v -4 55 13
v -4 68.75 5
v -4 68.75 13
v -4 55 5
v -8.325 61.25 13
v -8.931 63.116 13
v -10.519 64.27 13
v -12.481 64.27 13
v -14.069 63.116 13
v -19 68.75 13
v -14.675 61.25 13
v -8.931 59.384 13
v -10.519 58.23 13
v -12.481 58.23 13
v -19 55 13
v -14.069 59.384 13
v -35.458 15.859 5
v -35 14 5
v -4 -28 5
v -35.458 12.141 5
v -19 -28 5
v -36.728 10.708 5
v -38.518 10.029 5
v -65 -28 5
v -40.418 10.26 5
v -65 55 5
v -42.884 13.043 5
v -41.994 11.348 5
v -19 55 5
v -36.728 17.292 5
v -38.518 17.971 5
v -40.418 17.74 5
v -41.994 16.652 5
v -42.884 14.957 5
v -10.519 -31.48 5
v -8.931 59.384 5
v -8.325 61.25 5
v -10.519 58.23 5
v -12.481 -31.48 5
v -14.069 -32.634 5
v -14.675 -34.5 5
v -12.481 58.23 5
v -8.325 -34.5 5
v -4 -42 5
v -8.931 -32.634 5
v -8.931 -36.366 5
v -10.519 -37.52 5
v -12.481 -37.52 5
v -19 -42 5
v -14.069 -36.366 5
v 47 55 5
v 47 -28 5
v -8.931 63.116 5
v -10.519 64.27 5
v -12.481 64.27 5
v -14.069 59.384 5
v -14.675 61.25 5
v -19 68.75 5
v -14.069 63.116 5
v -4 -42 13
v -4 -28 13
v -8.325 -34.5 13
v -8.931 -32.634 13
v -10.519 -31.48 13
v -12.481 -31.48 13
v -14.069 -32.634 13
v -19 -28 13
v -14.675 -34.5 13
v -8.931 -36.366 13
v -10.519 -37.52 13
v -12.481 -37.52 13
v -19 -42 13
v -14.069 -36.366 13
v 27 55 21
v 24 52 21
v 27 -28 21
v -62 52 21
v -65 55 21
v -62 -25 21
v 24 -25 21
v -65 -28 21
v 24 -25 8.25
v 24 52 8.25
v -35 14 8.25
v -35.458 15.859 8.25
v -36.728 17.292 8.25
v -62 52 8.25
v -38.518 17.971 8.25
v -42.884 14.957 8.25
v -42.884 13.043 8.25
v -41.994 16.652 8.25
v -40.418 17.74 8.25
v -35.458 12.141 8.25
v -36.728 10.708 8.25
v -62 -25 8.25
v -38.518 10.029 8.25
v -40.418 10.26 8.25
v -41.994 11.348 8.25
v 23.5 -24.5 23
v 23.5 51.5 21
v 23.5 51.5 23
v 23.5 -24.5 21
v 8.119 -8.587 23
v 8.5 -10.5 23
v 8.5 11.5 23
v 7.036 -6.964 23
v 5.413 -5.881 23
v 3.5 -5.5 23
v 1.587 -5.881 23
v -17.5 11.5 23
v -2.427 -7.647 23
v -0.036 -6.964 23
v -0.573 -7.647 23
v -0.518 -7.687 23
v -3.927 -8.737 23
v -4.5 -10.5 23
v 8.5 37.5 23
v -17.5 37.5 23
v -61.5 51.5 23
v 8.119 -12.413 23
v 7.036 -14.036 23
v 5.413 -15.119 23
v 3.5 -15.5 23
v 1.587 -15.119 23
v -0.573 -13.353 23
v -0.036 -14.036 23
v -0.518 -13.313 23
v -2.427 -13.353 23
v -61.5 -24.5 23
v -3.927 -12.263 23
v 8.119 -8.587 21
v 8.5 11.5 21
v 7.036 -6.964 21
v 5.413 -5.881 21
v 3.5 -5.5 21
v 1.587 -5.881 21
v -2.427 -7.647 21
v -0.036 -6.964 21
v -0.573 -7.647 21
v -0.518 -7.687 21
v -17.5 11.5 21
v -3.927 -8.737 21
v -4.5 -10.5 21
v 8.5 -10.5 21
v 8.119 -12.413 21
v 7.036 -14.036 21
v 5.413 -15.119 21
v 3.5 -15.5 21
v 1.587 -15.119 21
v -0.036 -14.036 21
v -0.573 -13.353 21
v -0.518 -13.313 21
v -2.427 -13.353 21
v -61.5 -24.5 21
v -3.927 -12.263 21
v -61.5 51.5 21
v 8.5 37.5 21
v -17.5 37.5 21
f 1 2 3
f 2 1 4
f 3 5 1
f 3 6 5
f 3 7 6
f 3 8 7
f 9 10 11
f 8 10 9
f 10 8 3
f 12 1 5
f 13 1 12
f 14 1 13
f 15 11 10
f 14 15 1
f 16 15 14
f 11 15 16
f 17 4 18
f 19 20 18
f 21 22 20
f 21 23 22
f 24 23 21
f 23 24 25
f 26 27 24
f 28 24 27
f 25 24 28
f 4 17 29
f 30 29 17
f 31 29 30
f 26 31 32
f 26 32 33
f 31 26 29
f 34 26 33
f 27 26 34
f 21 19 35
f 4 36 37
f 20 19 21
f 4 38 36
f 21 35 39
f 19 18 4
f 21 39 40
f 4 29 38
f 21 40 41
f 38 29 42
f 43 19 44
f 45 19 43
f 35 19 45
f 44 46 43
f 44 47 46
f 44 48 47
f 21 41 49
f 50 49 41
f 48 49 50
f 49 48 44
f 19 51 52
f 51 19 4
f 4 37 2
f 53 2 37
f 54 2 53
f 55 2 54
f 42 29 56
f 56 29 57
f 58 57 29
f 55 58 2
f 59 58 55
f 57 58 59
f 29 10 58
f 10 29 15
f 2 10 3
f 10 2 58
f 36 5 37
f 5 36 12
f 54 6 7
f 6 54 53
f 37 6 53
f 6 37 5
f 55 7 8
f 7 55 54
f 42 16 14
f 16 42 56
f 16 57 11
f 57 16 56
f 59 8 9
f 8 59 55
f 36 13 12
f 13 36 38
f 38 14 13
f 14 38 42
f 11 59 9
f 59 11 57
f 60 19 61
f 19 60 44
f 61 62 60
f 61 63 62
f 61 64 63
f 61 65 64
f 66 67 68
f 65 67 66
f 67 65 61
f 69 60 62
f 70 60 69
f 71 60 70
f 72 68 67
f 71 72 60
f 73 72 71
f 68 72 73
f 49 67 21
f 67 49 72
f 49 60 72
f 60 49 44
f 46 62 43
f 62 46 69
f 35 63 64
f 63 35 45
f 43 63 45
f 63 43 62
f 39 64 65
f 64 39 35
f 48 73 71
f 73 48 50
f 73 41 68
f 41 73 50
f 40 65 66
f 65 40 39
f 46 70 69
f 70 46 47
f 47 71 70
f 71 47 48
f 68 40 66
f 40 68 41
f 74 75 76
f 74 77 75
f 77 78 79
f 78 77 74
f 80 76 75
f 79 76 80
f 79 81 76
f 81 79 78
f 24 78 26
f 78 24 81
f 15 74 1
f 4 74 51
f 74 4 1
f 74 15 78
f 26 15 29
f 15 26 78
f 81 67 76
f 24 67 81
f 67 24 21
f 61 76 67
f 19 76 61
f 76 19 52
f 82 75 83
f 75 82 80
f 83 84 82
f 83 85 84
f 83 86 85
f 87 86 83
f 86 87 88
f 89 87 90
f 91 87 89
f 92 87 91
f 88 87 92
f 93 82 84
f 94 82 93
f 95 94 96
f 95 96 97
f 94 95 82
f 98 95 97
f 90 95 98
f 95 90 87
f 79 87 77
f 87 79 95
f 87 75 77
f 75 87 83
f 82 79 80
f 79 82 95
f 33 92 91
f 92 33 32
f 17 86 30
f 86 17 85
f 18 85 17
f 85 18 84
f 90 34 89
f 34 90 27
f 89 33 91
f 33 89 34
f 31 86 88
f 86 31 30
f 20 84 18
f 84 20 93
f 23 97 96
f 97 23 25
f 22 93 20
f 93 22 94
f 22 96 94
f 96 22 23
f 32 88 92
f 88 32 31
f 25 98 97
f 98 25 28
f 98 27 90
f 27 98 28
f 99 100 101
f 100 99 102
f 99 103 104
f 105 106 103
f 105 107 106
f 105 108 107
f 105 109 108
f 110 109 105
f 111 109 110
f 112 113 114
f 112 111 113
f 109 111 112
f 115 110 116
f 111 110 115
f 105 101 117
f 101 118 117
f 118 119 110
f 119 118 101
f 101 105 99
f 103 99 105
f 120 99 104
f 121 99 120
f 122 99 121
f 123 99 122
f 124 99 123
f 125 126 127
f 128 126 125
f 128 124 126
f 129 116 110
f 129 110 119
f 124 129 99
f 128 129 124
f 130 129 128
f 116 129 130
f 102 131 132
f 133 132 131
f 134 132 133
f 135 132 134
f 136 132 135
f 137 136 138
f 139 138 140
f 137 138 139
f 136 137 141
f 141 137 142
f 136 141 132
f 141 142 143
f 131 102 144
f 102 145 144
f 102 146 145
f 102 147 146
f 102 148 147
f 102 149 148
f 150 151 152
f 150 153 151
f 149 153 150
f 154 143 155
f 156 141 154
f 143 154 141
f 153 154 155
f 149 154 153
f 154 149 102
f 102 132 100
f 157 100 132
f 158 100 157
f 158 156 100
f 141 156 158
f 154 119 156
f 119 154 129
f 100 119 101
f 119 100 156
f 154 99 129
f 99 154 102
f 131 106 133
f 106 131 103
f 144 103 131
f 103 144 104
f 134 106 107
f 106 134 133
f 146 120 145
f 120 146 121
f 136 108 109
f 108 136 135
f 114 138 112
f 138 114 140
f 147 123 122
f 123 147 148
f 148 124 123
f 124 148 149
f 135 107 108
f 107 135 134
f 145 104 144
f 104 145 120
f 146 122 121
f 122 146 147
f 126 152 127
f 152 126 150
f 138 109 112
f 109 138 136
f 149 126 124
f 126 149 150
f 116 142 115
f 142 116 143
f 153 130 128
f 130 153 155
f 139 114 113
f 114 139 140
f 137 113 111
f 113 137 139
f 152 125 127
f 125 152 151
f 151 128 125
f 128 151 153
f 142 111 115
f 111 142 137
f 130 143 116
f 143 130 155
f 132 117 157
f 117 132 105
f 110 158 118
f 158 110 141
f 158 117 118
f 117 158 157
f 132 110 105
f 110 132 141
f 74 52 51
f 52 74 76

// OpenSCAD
module mount (){
	difference(){
		import("gnss_mount.stl", convexity=6);
		translate([-30,-30,0])cube([60,64,20]);
	}
}

module cover (){
	import("gnss_cover.stl", convexity=6);
}

module meatball (){
	import("meatball.stl", convexity=9);
}

module spacer (){
	import("gnss_spacer.stl", convexity=6);
}

module Pitot_bottom (){
	import("Pitot_bottom.stl", convexity=9);
}

module Pitot_cutout (){
	import("Pitot_cutout.stl", convexity=6);
}

module Pitot_top (){
	import("Pitot_top.stl", convexity=6);
}

module plate(){ //top plate
	
	difference(){ //holes into cover
		cube([85,76,2]);
		translate([65,14,-0.5])cylinder(h=3,r=5);
		translate([65-5,14,-0.5])cylinder(h=3,r=3);
		translate([44,36,-0.5])cube([26,26,3]);
		//translate([50,32,-0.5])cube([17,17,1]);
	}

}

module foot(){
	
	difference(){
		cube([15,15,8]);
		translate([7.5,7.5,-0.5])cylinder(d=6.35,9.5);
	}
}

h = 92;
w = 83;

module mount2(){
		
		depth = 16;
		difference(){
			cube([h,w,depth]);
			translate([3,3,3.25])cube([h-6,w-6,depth+5]);
			translate([26,42,-1])cylinder(h=9,r=4);
		}
}

translate([27,13.5,15])polyhedron(
  points=[ [0,w/2,6], //0
			[0,w/2,-10], //1
			[0,-w/2,-10], //2
			[0,-w/2,6], //3 the four points at base the apex point 
             [20,w/2,-10], //4 
			[20,-w/2,-10]],//5 
  	faces=[ [0,1,4],[5,4,1,2],[5,2,3],[0,4,5,3],[3,2,1,0]          // each triangle side
             ]           // two triangles for square base
 );

//,[2,3,5], [2,3,5,4], [1,2,4,5], [0,1,2,3],[0,1,4], [0,2,5,4]

translate([-19,53.75,5])foot();
translate([-19,-42,5])foot();
translate([-65,-28, 5])mount2();
translate([-61.5,-24.5,21])plate();

// //translate([-30,30,-20]) rotate([90,0,0]) scale([1.2,1.2,1.2]) mount();
// //rotate([-90,0,90]) translate([-40,-40,-40])cover();

//rotate([-90,180,0]) translate([-25,-65,-16])scale([1.2,1.2,1.2])spacer();

//rotate([0,0,-90]) translate([15,33,80]) scale([1.1,1.1,1.1])Pitot_bottom();
//rotate([0,0,-90]) translate([15,39,80]) Pitot_top();	

//rotate([0,0,-90]) translate([0,-23,35])scale([.3,.3,.2]) meatball();
